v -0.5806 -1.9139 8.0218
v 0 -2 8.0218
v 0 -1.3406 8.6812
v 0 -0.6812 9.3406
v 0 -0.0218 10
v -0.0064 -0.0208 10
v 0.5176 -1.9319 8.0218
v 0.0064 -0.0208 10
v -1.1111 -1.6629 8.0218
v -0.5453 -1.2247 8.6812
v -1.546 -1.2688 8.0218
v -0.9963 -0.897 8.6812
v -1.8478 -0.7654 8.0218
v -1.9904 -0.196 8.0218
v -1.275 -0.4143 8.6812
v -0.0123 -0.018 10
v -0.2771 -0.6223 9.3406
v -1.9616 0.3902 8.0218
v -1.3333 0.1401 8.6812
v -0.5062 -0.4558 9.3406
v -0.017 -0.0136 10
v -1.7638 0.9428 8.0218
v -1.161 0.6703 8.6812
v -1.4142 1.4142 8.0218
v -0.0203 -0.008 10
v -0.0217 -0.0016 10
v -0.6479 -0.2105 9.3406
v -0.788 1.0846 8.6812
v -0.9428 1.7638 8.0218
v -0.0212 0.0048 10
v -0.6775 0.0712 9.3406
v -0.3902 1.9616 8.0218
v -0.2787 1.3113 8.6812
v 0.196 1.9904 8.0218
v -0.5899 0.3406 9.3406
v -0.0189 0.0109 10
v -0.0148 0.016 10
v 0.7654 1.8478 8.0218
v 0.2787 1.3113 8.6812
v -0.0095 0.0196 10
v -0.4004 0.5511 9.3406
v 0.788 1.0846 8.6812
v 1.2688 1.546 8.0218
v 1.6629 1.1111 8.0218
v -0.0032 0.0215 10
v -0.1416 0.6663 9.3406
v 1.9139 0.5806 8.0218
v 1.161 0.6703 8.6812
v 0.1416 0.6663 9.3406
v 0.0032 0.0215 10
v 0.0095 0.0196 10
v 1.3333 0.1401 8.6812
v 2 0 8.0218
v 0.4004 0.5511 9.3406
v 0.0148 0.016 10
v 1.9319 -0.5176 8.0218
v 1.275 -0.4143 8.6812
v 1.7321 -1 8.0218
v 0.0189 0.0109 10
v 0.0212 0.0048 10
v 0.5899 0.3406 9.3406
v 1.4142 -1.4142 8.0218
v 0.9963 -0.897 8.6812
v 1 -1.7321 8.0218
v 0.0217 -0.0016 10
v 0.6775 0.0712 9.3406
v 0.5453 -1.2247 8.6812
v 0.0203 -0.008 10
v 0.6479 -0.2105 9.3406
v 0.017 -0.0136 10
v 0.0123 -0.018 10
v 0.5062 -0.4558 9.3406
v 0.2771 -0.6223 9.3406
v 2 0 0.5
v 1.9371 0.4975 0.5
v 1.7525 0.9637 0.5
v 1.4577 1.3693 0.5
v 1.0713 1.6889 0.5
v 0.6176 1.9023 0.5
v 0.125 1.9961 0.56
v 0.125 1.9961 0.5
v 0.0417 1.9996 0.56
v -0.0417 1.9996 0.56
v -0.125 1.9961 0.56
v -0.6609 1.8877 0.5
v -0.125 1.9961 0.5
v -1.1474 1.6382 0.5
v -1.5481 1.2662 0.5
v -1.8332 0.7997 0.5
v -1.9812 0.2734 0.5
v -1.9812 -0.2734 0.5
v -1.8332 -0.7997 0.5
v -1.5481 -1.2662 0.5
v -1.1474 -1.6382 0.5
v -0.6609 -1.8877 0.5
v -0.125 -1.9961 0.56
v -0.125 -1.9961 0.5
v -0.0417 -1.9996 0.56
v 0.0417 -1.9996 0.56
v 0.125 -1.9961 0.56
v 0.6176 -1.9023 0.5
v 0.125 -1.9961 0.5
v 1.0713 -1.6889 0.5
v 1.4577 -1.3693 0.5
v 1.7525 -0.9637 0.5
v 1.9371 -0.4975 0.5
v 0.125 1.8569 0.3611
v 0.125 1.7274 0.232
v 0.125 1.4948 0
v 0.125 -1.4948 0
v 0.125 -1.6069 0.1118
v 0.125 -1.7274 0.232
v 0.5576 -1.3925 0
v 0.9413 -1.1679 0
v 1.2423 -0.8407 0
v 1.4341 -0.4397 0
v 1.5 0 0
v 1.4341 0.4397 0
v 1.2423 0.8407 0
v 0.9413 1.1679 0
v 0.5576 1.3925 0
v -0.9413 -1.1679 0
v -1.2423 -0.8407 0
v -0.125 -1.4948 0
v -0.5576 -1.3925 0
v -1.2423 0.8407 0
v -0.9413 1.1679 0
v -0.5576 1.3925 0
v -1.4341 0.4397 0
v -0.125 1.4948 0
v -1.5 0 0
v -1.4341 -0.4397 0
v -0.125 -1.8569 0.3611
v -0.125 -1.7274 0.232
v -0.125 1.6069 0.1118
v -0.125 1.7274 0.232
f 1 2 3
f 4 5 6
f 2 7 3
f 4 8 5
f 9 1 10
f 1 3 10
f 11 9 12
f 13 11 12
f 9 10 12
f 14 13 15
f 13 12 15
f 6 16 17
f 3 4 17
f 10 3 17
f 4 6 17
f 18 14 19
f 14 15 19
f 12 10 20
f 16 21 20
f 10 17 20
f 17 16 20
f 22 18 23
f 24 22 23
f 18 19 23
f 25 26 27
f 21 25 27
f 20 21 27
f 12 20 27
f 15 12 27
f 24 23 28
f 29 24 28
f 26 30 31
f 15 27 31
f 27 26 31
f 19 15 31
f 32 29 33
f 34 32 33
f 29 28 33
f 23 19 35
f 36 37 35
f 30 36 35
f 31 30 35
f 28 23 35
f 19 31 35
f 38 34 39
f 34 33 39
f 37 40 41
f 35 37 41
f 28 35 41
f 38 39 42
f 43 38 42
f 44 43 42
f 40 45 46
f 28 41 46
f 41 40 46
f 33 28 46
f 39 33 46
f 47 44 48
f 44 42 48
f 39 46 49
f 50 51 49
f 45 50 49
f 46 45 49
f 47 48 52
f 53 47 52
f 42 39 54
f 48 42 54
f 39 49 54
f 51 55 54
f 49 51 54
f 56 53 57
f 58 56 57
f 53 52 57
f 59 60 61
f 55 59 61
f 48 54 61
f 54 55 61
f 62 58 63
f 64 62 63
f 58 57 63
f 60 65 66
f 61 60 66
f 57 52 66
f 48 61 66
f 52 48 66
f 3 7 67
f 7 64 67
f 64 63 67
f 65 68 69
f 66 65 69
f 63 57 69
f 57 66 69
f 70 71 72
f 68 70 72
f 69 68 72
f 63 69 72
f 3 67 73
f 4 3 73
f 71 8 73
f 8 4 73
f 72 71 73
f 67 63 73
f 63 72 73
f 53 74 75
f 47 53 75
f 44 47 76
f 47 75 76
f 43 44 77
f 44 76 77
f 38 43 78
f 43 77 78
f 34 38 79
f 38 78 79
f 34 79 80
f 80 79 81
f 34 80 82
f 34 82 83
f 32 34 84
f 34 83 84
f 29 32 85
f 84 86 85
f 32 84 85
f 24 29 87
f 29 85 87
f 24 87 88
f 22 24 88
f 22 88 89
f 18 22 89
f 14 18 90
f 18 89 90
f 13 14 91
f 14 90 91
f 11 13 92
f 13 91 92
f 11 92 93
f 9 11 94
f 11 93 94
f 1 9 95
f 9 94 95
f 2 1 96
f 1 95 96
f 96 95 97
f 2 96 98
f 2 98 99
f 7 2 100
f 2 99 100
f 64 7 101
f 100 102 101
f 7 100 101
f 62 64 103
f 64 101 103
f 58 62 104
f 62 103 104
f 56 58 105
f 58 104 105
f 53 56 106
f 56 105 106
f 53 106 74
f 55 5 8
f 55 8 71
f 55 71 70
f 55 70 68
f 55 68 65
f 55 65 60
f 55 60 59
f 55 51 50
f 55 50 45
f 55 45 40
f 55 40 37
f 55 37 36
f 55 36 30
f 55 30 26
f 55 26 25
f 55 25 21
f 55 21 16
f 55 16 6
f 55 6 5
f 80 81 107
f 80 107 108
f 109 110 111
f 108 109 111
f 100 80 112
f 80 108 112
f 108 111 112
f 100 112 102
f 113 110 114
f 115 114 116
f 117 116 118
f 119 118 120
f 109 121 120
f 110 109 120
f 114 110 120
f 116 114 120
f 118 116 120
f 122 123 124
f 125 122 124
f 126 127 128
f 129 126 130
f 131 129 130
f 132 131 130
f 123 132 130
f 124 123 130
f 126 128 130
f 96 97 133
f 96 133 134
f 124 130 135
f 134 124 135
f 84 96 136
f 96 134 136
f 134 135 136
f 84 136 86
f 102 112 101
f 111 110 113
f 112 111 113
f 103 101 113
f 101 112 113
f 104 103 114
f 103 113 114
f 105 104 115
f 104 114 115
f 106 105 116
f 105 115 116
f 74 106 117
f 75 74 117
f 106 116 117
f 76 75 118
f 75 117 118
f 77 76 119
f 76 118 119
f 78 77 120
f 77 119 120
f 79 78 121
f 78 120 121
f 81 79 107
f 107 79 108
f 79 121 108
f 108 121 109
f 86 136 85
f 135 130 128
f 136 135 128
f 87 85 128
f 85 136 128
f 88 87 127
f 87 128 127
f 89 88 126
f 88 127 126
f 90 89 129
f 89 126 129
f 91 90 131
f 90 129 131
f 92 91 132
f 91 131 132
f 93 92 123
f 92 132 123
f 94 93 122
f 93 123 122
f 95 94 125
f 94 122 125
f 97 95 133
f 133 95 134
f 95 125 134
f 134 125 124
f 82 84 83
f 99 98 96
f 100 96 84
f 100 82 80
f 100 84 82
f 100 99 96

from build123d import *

# Parameters (mm, degrees)
F0_R     = 2
F1_DEPTH = 10
F4_SIZE  = 0.5
F6_DEPTH = 0.56


with BuildPart() as f1:
    # F0 (on Top) → F1 (new body)
    with BuildSketch(Plane.XY):
        Circle(F0_R)
    extrude(amount=F1_DEPTH)

    # F2 (on Right) → F3 (revolve, cut)
    with BuildSketch(Plane.YZ):
        Polygon((0, 10.2037759498), (-2.4595215172, 10.2037759498), (-2.4595215172, 7.5622705054), (0, 10.0217920226), align=None)
    revolve(axis=Axis((0, 0, 10.1127839862), (0, 0, -1)), mode=Mode.SUBTRACT)

    # F4
    f4_edges = [f1.edges().sort_by_distance(p)[0] for p in [
        (-2, 0, 0),
    ]]
    chamfer(f4_edges, length=F4_SIZE)

    # F5 (on face) → F6 (cut)
    with BuildSketch(Plane(origin=(0, 0, 0), x_dir=(1, 0, 0), z_dir=(0, 0, -1))):
        with BuildLine():
            ThreePointArc((-0.125, 1.4947825929), (0, 1.5), (0.125, 1.4947825929))
            Line((0.125, 1.4947825929), (0.125, 2.363476136))
            Line((0.125, 2.363476136), (-0.125, 2.363476136))
            Line((-0.125, 2.363476136), (-0.125, 1.4947825929))
        make_face()
        with BuildLine():
            ThreePointArc((-0.125, -1.4947825929), (0, -1.5), (0.125, -1.4947825929))
            Line((0.125, -1.4947825929), (0.125, 1.4947825929))
            ThreePointArc((0.125, 1.4947825929), (0, 1.5), (-0.125, 1.4947825929))
            Line((-0.125, 1.4947825929), (-0.125, -1.4947825929))
        make_face()
        with BuildLine():
            Line((-0.125, -2.363476136), (0.125, -2.363476136))
            Line((0.125, -2.363476136), (0.125, -1.4947825929))
            ThreePointArc((0.125, -1.4947825929), (0, -1.5), (-0.125, -1.4947825929))
            Line((-0.125, -1.4947825929), (-0.125, -2.363476136))
        make_face()
    extrude(amount=-F6_DEPTH, mode=Mode.SUBTRACT)


solid = f1.part
